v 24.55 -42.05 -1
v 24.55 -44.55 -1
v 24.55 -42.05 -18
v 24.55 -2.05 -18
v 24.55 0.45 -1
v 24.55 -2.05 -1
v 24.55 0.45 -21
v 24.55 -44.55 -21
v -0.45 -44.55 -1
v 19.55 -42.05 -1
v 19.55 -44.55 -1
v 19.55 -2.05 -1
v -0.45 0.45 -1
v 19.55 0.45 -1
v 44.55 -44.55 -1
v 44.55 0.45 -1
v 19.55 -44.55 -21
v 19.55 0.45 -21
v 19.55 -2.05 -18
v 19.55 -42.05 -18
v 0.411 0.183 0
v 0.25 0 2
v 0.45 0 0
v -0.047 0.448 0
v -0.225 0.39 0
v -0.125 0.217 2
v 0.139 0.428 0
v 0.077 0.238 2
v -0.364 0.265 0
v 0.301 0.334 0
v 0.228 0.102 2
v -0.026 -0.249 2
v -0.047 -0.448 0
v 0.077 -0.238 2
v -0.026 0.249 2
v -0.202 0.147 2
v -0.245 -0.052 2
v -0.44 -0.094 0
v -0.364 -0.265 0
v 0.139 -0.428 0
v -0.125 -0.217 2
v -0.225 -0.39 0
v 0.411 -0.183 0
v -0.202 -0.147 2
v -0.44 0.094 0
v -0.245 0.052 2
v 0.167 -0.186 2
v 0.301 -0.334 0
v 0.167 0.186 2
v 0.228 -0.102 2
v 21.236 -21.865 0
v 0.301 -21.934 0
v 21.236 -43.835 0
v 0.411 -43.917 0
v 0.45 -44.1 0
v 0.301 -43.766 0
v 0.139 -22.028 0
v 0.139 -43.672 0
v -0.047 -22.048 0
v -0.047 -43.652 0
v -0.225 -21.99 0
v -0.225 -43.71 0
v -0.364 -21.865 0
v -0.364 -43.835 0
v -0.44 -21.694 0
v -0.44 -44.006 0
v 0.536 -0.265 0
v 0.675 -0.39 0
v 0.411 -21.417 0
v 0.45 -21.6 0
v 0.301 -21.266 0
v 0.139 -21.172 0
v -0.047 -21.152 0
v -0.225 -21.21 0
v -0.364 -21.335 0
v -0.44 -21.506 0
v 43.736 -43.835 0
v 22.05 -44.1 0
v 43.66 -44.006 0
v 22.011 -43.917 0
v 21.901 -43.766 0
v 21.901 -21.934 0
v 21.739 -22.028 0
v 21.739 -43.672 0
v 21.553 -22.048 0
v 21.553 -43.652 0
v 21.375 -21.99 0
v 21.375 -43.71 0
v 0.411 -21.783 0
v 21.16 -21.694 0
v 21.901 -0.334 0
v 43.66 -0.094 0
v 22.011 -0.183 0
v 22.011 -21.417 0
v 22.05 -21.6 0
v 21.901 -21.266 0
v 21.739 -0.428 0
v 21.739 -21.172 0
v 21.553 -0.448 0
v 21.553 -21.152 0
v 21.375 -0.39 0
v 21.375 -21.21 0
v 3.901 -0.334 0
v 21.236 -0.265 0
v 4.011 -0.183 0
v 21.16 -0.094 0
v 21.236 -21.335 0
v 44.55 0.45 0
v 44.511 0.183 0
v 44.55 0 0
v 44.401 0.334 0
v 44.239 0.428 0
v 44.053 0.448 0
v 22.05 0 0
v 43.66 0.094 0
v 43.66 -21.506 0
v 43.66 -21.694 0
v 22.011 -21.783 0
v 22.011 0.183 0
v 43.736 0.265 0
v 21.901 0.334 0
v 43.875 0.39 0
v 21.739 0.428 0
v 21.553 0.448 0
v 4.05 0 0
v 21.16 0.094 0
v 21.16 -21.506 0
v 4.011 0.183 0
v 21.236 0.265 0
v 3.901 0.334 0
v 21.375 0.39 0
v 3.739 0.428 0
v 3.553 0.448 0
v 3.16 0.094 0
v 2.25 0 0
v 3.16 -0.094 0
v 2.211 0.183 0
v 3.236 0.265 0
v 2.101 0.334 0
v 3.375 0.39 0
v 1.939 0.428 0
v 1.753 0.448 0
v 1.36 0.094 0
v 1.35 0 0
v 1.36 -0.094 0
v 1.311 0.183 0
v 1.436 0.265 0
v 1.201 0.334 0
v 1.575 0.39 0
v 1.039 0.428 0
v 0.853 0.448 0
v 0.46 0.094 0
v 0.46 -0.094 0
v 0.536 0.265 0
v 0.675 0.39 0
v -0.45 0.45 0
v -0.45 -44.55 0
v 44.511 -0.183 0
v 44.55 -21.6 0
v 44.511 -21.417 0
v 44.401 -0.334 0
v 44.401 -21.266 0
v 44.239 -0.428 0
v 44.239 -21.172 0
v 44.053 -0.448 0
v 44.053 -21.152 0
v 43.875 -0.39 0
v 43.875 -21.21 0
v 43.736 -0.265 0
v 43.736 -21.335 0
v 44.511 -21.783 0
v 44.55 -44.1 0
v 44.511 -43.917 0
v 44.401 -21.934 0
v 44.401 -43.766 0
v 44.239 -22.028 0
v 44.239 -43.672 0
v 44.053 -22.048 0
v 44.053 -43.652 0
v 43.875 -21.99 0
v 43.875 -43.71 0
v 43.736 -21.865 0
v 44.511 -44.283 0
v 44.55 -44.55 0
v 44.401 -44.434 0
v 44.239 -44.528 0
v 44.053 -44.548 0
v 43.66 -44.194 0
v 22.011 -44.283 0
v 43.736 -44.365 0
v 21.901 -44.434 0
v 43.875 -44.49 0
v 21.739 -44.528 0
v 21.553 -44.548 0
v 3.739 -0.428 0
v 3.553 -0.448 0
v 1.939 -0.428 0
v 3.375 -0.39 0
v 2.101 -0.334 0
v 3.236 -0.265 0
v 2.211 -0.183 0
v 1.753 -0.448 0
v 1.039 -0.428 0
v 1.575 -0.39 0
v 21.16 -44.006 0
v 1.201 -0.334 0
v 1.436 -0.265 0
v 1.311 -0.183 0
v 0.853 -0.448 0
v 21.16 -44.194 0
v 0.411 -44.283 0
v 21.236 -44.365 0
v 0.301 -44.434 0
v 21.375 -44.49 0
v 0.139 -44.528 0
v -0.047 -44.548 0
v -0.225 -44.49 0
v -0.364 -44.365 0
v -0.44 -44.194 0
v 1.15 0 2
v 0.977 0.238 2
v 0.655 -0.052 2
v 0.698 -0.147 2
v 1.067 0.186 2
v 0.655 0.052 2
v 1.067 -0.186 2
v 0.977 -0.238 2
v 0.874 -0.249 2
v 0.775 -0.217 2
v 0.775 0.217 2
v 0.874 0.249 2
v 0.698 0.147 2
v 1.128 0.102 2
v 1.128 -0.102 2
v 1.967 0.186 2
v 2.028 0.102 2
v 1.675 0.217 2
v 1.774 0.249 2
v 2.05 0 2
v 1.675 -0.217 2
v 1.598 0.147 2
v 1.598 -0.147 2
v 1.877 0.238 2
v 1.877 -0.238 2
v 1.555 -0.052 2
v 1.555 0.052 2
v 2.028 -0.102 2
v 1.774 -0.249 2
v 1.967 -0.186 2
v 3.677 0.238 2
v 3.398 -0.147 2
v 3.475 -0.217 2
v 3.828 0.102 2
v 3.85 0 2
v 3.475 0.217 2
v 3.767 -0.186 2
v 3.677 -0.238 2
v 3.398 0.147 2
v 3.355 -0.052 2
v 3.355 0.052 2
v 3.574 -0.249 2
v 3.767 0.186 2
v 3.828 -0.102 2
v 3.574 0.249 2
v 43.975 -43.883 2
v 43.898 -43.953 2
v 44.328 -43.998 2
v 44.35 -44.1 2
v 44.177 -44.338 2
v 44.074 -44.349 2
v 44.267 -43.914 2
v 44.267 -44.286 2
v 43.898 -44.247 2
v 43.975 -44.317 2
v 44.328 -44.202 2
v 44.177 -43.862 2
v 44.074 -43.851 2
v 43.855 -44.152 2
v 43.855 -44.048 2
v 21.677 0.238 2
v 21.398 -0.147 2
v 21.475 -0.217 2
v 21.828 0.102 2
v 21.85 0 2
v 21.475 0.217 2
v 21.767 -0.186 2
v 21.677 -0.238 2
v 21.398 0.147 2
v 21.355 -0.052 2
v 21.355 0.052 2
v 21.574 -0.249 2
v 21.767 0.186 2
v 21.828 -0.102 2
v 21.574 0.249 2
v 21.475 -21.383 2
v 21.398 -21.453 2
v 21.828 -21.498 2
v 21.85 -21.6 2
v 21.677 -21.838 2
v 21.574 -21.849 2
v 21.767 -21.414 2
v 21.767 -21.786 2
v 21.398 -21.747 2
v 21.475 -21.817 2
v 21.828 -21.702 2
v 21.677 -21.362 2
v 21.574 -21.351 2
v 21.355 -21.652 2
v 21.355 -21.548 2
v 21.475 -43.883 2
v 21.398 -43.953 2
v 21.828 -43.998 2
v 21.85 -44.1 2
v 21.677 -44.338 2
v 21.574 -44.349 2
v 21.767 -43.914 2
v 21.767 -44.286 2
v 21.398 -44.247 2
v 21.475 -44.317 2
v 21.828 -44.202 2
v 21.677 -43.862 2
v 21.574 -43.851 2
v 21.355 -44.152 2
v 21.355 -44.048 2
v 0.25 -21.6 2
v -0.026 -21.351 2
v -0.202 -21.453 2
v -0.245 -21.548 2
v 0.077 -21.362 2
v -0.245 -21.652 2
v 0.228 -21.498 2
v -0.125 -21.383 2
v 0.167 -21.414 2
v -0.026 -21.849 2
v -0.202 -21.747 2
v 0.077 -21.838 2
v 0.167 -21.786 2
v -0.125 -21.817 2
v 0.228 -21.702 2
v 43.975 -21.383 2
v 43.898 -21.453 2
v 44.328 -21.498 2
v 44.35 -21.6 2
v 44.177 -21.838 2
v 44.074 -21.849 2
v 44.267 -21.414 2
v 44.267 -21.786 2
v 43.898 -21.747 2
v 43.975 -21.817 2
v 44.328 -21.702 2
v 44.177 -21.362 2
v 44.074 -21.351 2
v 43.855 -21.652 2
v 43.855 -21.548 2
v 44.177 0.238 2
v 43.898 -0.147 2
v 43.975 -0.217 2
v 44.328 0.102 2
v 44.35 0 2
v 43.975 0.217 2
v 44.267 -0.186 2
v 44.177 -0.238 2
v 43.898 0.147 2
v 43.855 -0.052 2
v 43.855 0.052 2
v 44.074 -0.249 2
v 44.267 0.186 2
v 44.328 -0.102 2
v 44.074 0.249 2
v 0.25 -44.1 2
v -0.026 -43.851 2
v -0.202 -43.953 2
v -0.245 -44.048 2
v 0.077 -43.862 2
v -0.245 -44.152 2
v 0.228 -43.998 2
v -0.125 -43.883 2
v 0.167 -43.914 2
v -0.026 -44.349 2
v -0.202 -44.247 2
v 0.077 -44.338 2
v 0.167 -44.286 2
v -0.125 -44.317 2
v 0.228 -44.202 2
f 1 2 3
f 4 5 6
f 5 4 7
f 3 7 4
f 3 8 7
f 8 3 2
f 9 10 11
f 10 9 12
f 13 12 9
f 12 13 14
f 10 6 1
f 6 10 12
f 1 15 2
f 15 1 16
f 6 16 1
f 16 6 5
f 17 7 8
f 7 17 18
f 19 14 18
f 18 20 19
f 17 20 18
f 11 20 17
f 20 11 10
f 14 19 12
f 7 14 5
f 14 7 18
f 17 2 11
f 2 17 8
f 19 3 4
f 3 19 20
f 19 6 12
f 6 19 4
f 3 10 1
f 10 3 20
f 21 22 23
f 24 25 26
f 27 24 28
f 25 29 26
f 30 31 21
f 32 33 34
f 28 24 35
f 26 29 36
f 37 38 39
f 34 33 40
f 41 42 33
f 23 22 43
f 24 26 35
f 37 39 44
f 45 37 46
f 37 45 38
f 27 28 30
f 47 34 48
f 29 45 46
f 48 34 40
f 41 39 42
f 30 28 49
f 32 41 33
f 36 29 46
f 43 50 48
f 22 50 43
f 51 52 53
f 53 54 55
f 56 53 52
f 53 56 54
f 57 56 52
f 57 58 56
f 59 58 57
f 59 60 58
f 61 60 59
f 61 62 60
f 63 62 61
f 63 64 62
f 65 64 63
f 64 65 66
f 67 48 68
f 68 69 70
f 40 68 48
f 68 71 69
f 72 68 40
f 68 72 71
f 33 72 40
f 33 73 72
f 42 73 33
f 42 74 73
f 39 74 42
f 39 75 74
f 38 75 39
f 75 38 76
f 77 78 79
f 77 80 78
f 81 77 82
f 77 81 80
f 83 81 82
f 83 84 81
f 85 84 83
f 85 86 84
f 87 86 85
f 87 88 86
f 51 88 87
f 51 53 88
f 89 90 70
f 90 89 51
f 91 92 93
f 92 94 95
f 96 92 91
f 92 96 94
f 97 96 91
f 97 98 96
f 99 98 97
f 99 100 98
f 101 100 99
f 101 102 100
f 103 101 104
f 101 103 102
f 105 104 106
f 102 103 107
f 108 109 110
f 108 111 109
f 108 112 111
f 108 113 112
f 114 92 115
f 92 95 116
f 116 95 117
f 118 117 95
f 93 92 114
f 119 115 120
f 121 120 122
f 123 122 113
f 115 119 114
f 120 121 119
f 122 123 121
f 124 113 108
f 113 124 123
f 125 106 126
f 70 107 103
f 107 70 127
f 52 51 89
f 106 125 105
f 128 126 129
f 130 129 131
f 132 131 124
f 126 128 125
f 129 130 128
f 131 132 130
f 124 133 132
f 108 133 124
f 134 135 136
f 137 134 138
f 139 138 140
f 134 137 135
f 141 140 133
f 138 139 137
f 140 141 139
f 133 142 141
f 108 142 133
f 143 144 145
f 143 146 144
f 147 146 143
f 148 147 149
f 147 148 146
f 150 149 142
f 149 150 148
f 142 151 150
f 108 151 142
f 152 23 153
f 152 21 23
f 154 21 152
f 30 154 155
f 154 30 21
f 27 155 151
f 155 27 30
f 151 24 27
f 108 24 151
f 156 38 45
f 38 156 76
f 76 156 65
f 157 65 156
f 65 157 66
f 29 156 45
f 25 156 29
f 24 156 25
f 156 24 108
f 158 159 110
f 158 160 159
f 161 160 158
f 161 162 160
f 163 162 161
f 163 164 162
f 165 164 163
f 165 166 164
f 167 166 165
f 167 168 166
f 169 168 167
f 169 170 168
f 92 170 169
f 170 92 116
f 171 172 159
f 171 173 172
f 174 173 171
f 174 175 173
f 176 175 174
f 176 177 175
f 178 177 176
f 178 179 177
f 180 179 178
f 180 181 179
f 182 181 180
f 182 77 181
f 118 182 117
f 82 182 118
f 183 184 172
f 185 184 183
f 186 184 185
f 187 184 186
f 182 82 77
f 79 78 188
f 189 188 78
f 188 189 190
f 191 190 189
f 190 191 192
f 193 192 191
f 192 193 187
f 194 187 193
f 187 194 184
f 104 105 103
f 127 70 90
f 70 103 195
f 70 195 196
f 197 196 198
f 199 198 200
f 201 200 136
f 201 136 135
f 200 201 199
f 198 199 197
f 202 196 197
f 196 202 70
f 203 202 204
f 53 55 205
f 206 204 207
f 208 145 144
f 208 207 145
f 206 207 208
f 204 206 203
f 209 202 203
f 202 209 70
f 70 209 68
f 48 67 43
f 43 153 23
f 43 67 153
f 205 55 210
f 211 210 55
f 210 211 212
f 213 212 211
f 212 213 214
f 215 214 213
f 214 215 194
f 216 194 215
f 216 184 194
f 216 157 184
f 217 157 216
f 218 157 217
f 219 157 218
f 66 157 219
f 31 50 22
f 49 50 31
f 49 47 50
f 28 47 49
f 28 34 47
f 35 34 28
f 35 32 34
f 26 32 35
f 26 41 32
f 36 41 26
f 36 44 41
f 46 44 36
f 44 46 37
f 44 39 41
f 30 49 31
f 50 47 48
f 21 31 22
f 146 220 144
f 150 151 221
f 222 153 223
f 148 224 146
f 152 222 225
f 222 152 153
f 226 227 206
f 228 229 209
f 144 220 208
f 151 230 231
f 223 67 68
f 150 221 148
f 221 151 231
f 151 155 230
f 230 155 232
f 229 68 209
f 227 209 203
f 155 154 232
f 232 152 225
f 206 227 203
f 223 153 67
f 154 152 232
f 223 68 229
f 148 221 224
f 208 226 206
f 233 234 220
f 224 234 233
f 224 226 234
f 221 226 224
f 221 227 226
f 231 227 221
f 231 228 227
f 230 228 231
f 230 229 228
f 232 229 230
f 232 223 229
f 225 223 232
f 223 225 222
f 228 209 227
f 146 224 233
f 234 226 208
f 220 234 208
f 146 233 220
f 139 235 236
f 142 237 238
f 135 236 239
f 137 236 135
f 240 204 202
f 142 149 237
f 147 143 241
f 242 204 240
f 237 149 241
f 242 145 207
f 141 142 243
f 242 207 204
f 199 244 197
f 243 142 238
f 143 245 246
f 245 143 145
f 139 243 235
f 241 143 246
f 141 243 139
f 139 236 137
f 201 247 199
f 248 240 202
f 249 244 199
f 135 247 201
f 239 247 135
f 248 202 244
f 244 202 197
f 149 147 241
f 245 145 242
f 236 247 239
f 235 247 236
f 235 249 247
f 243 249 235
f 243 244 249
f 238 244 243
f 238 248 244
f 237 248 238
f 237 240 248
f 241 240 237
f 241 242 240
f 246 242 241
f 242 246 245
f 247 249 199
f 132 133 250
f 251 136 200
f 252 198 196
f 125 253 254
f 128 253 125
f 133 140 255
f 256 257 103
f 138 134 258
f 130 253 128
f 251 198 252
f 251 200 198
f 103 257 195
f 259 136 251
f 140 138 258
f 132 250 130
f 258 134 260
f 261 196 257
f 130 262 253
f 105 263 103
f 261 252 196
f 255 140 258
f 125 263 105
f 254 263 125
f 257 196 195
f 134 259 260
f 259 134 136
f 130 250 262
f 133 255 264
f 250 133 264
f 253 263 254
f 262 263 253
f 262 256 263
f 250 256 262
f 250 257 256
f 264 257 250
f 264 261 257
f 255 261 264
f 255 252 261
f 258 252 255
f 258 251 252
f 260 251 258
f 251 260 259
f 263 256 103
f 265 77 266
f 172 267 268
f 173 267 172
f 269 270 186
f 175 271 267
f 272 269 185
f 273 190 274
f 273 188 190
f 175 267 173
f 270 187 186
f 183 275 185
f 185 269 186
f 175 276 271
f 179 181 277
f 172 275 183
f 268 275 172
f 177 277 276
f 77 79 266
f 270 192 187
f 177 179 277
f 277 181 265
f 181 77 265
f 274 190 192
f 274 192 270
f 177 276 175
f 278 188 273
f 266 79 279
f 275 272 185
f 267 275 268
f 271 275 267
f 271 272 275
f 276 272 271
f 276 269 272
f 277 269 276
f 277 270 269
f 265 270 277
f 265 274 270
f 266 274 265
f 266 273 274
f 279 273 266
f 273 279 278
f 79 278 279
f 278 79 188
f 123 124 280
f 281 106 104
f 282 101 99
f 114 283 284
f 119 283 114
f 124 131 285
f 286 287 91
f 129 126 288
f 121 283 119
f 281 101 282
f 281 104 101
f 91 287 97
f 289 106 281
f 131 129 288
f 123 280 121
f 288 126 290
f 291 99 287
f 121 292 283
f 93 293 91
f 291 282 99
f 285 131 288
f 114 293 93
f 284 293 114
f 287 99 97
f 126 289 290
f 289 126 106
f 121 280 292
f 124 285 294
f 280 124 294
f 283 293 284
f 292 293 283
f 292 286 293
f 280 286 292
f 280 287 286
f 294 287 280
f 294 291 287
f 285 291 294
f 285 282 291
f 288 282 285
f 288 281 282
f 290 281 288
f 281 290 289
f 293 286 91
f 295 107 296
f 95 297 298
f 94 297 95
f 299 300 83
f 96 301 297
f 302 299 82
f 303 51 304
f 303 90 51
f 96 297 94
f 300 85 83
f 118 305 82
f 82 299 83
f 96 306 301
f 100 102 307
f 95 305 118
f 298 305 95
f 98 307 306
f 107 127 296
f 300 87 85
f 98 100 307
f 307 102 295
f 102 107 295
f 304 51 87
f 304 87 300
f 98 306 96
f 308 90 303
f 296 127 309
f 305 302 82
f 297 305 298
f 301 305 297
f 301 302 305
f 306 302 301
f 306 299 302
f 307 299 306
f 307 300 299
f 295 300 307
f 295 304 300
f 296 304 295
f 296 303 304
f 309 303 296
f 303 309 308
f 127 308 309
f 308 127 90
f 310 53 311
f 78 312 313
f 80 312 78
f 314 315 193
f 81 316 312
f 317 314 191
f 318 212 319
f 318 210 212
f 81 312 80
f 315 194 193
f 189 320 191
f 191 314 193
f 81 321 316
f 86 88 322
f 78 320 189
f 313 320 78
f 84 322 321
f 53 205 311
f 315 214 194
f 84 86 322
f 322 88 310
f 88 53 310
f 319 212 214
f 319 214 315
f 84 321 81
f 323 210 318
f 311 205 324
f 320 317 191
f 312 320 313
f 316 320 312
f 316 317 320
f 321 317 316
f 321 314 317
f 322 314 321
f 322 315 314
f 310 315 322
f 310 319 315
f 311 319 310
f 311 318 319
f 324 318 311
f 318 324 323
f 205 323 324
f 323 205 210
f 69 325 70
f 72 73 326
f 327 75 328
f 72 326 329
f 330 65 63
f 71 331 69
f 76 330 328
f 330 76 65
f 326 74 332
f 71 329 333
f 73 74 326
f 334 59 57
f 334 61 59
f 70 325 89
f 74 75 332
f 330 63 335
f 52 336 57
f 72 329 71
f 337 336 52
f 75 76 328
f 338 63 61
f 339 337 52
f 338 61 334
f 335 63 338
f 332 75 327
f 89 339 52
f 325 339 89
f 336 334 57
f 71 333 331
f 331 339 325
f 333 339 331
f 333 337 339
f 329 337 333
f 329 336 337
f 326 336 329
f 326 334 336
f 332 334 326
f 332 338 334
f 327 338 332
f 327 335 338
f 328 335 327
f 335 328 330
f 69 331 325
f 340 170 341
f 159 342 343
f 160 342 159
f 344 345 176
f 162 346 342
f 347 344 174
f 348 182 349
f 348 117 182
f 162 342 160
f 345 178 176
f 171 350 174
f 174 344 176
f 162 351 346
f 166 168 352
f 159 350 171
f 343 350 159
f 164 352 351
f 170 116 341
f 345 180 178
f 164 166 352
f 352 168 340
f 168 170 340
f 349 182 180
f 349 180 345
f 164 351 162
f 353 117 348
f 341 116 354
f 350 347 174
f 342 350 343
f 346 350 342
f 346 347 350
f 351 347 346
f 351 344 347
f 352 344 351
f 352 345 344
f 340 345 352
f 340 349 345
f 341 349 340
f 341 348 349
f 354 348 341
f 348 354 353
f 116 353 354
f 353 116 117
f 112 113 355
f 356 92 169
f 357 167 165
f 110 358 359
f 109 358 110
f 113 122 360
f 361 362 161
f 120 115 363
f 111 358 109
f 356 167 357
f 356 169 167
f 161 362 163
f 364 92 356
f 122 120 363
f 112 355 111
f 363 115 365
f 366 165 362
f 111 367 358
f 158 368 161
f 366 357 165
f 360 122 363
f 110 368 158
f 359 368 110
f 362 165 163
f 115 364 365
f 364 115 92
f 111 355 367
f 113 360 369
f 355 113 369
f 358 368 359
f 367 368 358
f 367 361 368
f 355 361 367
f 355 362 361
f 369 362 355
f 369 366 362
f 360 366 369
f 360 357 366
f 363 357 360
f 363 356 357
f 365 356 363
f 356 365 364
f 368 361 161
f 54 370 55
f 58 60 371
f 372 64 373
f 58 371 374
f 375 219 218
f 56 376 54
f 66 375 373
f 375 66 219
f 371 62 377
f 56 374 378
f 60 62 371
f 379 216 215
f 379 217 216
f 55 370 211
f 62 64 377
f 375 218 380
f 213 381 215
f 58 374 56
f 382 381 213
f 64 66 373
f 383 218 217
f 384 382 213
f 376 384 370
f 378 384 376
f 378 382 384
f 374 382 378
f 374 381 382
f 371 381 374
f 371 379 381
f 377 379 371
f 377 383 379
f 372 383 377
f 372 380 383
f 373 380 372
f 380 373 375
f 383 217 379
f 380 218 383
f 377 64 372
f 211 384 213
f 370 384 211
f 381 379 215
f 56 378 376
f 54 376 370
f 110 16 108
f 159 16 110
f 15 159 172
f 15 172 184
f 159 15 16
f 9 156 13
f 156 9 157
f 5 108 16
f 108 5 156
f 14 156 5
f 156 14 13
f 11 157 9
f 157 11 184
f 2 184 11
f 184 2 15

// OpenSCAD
$fn=15;
gridLength = 45;
gridSquares = 50;
oneGridLength = gridLength / gridSquares;
platformThickness = 1;
handleThickness = 5;
handleHeight = 20;

module buildPlatform(){
  translate([22.05,-22.05, -0.5 * platformThickness])
  cube([45,45,platformThickness], center = true);  
    
}

module buildHandle(){
    translate([22.05,-22.05,-0.5 * handleHeight - platformThickness])
    difference(){
        cube([handleThickness, 45, handleHeight], center = true);
        translate([0,0,4])
        cube([handleThickness + 1, 40, 22], center = true);
    }
    
    
}

module buildStamp(coordinates){
  buildPlatform();
  buildHandle();
  
  for (i=[0:1:len(coordinates) - 1]){
    coordinate = coordinates[i];
    rowNumber = coordinate[0];
    columnNumber = coordinate[1];
    translate([columnNumber * oneGridLength,rowNumber * -1 * oneGridLength,0])
        cylinder(h=2,d1=oneGridLength, d2 = 0.5);
      
  }
    
}

//Coordinates example: 
buildStamp(receiver_coordinates);

receiver_coordinates = [[0,0], [0,1], [0,2], [0,4], [49,49], [0, 24], [24, 24], [49, 24], [24, 0], [24, 49], [0, 49], [49, 0]];
